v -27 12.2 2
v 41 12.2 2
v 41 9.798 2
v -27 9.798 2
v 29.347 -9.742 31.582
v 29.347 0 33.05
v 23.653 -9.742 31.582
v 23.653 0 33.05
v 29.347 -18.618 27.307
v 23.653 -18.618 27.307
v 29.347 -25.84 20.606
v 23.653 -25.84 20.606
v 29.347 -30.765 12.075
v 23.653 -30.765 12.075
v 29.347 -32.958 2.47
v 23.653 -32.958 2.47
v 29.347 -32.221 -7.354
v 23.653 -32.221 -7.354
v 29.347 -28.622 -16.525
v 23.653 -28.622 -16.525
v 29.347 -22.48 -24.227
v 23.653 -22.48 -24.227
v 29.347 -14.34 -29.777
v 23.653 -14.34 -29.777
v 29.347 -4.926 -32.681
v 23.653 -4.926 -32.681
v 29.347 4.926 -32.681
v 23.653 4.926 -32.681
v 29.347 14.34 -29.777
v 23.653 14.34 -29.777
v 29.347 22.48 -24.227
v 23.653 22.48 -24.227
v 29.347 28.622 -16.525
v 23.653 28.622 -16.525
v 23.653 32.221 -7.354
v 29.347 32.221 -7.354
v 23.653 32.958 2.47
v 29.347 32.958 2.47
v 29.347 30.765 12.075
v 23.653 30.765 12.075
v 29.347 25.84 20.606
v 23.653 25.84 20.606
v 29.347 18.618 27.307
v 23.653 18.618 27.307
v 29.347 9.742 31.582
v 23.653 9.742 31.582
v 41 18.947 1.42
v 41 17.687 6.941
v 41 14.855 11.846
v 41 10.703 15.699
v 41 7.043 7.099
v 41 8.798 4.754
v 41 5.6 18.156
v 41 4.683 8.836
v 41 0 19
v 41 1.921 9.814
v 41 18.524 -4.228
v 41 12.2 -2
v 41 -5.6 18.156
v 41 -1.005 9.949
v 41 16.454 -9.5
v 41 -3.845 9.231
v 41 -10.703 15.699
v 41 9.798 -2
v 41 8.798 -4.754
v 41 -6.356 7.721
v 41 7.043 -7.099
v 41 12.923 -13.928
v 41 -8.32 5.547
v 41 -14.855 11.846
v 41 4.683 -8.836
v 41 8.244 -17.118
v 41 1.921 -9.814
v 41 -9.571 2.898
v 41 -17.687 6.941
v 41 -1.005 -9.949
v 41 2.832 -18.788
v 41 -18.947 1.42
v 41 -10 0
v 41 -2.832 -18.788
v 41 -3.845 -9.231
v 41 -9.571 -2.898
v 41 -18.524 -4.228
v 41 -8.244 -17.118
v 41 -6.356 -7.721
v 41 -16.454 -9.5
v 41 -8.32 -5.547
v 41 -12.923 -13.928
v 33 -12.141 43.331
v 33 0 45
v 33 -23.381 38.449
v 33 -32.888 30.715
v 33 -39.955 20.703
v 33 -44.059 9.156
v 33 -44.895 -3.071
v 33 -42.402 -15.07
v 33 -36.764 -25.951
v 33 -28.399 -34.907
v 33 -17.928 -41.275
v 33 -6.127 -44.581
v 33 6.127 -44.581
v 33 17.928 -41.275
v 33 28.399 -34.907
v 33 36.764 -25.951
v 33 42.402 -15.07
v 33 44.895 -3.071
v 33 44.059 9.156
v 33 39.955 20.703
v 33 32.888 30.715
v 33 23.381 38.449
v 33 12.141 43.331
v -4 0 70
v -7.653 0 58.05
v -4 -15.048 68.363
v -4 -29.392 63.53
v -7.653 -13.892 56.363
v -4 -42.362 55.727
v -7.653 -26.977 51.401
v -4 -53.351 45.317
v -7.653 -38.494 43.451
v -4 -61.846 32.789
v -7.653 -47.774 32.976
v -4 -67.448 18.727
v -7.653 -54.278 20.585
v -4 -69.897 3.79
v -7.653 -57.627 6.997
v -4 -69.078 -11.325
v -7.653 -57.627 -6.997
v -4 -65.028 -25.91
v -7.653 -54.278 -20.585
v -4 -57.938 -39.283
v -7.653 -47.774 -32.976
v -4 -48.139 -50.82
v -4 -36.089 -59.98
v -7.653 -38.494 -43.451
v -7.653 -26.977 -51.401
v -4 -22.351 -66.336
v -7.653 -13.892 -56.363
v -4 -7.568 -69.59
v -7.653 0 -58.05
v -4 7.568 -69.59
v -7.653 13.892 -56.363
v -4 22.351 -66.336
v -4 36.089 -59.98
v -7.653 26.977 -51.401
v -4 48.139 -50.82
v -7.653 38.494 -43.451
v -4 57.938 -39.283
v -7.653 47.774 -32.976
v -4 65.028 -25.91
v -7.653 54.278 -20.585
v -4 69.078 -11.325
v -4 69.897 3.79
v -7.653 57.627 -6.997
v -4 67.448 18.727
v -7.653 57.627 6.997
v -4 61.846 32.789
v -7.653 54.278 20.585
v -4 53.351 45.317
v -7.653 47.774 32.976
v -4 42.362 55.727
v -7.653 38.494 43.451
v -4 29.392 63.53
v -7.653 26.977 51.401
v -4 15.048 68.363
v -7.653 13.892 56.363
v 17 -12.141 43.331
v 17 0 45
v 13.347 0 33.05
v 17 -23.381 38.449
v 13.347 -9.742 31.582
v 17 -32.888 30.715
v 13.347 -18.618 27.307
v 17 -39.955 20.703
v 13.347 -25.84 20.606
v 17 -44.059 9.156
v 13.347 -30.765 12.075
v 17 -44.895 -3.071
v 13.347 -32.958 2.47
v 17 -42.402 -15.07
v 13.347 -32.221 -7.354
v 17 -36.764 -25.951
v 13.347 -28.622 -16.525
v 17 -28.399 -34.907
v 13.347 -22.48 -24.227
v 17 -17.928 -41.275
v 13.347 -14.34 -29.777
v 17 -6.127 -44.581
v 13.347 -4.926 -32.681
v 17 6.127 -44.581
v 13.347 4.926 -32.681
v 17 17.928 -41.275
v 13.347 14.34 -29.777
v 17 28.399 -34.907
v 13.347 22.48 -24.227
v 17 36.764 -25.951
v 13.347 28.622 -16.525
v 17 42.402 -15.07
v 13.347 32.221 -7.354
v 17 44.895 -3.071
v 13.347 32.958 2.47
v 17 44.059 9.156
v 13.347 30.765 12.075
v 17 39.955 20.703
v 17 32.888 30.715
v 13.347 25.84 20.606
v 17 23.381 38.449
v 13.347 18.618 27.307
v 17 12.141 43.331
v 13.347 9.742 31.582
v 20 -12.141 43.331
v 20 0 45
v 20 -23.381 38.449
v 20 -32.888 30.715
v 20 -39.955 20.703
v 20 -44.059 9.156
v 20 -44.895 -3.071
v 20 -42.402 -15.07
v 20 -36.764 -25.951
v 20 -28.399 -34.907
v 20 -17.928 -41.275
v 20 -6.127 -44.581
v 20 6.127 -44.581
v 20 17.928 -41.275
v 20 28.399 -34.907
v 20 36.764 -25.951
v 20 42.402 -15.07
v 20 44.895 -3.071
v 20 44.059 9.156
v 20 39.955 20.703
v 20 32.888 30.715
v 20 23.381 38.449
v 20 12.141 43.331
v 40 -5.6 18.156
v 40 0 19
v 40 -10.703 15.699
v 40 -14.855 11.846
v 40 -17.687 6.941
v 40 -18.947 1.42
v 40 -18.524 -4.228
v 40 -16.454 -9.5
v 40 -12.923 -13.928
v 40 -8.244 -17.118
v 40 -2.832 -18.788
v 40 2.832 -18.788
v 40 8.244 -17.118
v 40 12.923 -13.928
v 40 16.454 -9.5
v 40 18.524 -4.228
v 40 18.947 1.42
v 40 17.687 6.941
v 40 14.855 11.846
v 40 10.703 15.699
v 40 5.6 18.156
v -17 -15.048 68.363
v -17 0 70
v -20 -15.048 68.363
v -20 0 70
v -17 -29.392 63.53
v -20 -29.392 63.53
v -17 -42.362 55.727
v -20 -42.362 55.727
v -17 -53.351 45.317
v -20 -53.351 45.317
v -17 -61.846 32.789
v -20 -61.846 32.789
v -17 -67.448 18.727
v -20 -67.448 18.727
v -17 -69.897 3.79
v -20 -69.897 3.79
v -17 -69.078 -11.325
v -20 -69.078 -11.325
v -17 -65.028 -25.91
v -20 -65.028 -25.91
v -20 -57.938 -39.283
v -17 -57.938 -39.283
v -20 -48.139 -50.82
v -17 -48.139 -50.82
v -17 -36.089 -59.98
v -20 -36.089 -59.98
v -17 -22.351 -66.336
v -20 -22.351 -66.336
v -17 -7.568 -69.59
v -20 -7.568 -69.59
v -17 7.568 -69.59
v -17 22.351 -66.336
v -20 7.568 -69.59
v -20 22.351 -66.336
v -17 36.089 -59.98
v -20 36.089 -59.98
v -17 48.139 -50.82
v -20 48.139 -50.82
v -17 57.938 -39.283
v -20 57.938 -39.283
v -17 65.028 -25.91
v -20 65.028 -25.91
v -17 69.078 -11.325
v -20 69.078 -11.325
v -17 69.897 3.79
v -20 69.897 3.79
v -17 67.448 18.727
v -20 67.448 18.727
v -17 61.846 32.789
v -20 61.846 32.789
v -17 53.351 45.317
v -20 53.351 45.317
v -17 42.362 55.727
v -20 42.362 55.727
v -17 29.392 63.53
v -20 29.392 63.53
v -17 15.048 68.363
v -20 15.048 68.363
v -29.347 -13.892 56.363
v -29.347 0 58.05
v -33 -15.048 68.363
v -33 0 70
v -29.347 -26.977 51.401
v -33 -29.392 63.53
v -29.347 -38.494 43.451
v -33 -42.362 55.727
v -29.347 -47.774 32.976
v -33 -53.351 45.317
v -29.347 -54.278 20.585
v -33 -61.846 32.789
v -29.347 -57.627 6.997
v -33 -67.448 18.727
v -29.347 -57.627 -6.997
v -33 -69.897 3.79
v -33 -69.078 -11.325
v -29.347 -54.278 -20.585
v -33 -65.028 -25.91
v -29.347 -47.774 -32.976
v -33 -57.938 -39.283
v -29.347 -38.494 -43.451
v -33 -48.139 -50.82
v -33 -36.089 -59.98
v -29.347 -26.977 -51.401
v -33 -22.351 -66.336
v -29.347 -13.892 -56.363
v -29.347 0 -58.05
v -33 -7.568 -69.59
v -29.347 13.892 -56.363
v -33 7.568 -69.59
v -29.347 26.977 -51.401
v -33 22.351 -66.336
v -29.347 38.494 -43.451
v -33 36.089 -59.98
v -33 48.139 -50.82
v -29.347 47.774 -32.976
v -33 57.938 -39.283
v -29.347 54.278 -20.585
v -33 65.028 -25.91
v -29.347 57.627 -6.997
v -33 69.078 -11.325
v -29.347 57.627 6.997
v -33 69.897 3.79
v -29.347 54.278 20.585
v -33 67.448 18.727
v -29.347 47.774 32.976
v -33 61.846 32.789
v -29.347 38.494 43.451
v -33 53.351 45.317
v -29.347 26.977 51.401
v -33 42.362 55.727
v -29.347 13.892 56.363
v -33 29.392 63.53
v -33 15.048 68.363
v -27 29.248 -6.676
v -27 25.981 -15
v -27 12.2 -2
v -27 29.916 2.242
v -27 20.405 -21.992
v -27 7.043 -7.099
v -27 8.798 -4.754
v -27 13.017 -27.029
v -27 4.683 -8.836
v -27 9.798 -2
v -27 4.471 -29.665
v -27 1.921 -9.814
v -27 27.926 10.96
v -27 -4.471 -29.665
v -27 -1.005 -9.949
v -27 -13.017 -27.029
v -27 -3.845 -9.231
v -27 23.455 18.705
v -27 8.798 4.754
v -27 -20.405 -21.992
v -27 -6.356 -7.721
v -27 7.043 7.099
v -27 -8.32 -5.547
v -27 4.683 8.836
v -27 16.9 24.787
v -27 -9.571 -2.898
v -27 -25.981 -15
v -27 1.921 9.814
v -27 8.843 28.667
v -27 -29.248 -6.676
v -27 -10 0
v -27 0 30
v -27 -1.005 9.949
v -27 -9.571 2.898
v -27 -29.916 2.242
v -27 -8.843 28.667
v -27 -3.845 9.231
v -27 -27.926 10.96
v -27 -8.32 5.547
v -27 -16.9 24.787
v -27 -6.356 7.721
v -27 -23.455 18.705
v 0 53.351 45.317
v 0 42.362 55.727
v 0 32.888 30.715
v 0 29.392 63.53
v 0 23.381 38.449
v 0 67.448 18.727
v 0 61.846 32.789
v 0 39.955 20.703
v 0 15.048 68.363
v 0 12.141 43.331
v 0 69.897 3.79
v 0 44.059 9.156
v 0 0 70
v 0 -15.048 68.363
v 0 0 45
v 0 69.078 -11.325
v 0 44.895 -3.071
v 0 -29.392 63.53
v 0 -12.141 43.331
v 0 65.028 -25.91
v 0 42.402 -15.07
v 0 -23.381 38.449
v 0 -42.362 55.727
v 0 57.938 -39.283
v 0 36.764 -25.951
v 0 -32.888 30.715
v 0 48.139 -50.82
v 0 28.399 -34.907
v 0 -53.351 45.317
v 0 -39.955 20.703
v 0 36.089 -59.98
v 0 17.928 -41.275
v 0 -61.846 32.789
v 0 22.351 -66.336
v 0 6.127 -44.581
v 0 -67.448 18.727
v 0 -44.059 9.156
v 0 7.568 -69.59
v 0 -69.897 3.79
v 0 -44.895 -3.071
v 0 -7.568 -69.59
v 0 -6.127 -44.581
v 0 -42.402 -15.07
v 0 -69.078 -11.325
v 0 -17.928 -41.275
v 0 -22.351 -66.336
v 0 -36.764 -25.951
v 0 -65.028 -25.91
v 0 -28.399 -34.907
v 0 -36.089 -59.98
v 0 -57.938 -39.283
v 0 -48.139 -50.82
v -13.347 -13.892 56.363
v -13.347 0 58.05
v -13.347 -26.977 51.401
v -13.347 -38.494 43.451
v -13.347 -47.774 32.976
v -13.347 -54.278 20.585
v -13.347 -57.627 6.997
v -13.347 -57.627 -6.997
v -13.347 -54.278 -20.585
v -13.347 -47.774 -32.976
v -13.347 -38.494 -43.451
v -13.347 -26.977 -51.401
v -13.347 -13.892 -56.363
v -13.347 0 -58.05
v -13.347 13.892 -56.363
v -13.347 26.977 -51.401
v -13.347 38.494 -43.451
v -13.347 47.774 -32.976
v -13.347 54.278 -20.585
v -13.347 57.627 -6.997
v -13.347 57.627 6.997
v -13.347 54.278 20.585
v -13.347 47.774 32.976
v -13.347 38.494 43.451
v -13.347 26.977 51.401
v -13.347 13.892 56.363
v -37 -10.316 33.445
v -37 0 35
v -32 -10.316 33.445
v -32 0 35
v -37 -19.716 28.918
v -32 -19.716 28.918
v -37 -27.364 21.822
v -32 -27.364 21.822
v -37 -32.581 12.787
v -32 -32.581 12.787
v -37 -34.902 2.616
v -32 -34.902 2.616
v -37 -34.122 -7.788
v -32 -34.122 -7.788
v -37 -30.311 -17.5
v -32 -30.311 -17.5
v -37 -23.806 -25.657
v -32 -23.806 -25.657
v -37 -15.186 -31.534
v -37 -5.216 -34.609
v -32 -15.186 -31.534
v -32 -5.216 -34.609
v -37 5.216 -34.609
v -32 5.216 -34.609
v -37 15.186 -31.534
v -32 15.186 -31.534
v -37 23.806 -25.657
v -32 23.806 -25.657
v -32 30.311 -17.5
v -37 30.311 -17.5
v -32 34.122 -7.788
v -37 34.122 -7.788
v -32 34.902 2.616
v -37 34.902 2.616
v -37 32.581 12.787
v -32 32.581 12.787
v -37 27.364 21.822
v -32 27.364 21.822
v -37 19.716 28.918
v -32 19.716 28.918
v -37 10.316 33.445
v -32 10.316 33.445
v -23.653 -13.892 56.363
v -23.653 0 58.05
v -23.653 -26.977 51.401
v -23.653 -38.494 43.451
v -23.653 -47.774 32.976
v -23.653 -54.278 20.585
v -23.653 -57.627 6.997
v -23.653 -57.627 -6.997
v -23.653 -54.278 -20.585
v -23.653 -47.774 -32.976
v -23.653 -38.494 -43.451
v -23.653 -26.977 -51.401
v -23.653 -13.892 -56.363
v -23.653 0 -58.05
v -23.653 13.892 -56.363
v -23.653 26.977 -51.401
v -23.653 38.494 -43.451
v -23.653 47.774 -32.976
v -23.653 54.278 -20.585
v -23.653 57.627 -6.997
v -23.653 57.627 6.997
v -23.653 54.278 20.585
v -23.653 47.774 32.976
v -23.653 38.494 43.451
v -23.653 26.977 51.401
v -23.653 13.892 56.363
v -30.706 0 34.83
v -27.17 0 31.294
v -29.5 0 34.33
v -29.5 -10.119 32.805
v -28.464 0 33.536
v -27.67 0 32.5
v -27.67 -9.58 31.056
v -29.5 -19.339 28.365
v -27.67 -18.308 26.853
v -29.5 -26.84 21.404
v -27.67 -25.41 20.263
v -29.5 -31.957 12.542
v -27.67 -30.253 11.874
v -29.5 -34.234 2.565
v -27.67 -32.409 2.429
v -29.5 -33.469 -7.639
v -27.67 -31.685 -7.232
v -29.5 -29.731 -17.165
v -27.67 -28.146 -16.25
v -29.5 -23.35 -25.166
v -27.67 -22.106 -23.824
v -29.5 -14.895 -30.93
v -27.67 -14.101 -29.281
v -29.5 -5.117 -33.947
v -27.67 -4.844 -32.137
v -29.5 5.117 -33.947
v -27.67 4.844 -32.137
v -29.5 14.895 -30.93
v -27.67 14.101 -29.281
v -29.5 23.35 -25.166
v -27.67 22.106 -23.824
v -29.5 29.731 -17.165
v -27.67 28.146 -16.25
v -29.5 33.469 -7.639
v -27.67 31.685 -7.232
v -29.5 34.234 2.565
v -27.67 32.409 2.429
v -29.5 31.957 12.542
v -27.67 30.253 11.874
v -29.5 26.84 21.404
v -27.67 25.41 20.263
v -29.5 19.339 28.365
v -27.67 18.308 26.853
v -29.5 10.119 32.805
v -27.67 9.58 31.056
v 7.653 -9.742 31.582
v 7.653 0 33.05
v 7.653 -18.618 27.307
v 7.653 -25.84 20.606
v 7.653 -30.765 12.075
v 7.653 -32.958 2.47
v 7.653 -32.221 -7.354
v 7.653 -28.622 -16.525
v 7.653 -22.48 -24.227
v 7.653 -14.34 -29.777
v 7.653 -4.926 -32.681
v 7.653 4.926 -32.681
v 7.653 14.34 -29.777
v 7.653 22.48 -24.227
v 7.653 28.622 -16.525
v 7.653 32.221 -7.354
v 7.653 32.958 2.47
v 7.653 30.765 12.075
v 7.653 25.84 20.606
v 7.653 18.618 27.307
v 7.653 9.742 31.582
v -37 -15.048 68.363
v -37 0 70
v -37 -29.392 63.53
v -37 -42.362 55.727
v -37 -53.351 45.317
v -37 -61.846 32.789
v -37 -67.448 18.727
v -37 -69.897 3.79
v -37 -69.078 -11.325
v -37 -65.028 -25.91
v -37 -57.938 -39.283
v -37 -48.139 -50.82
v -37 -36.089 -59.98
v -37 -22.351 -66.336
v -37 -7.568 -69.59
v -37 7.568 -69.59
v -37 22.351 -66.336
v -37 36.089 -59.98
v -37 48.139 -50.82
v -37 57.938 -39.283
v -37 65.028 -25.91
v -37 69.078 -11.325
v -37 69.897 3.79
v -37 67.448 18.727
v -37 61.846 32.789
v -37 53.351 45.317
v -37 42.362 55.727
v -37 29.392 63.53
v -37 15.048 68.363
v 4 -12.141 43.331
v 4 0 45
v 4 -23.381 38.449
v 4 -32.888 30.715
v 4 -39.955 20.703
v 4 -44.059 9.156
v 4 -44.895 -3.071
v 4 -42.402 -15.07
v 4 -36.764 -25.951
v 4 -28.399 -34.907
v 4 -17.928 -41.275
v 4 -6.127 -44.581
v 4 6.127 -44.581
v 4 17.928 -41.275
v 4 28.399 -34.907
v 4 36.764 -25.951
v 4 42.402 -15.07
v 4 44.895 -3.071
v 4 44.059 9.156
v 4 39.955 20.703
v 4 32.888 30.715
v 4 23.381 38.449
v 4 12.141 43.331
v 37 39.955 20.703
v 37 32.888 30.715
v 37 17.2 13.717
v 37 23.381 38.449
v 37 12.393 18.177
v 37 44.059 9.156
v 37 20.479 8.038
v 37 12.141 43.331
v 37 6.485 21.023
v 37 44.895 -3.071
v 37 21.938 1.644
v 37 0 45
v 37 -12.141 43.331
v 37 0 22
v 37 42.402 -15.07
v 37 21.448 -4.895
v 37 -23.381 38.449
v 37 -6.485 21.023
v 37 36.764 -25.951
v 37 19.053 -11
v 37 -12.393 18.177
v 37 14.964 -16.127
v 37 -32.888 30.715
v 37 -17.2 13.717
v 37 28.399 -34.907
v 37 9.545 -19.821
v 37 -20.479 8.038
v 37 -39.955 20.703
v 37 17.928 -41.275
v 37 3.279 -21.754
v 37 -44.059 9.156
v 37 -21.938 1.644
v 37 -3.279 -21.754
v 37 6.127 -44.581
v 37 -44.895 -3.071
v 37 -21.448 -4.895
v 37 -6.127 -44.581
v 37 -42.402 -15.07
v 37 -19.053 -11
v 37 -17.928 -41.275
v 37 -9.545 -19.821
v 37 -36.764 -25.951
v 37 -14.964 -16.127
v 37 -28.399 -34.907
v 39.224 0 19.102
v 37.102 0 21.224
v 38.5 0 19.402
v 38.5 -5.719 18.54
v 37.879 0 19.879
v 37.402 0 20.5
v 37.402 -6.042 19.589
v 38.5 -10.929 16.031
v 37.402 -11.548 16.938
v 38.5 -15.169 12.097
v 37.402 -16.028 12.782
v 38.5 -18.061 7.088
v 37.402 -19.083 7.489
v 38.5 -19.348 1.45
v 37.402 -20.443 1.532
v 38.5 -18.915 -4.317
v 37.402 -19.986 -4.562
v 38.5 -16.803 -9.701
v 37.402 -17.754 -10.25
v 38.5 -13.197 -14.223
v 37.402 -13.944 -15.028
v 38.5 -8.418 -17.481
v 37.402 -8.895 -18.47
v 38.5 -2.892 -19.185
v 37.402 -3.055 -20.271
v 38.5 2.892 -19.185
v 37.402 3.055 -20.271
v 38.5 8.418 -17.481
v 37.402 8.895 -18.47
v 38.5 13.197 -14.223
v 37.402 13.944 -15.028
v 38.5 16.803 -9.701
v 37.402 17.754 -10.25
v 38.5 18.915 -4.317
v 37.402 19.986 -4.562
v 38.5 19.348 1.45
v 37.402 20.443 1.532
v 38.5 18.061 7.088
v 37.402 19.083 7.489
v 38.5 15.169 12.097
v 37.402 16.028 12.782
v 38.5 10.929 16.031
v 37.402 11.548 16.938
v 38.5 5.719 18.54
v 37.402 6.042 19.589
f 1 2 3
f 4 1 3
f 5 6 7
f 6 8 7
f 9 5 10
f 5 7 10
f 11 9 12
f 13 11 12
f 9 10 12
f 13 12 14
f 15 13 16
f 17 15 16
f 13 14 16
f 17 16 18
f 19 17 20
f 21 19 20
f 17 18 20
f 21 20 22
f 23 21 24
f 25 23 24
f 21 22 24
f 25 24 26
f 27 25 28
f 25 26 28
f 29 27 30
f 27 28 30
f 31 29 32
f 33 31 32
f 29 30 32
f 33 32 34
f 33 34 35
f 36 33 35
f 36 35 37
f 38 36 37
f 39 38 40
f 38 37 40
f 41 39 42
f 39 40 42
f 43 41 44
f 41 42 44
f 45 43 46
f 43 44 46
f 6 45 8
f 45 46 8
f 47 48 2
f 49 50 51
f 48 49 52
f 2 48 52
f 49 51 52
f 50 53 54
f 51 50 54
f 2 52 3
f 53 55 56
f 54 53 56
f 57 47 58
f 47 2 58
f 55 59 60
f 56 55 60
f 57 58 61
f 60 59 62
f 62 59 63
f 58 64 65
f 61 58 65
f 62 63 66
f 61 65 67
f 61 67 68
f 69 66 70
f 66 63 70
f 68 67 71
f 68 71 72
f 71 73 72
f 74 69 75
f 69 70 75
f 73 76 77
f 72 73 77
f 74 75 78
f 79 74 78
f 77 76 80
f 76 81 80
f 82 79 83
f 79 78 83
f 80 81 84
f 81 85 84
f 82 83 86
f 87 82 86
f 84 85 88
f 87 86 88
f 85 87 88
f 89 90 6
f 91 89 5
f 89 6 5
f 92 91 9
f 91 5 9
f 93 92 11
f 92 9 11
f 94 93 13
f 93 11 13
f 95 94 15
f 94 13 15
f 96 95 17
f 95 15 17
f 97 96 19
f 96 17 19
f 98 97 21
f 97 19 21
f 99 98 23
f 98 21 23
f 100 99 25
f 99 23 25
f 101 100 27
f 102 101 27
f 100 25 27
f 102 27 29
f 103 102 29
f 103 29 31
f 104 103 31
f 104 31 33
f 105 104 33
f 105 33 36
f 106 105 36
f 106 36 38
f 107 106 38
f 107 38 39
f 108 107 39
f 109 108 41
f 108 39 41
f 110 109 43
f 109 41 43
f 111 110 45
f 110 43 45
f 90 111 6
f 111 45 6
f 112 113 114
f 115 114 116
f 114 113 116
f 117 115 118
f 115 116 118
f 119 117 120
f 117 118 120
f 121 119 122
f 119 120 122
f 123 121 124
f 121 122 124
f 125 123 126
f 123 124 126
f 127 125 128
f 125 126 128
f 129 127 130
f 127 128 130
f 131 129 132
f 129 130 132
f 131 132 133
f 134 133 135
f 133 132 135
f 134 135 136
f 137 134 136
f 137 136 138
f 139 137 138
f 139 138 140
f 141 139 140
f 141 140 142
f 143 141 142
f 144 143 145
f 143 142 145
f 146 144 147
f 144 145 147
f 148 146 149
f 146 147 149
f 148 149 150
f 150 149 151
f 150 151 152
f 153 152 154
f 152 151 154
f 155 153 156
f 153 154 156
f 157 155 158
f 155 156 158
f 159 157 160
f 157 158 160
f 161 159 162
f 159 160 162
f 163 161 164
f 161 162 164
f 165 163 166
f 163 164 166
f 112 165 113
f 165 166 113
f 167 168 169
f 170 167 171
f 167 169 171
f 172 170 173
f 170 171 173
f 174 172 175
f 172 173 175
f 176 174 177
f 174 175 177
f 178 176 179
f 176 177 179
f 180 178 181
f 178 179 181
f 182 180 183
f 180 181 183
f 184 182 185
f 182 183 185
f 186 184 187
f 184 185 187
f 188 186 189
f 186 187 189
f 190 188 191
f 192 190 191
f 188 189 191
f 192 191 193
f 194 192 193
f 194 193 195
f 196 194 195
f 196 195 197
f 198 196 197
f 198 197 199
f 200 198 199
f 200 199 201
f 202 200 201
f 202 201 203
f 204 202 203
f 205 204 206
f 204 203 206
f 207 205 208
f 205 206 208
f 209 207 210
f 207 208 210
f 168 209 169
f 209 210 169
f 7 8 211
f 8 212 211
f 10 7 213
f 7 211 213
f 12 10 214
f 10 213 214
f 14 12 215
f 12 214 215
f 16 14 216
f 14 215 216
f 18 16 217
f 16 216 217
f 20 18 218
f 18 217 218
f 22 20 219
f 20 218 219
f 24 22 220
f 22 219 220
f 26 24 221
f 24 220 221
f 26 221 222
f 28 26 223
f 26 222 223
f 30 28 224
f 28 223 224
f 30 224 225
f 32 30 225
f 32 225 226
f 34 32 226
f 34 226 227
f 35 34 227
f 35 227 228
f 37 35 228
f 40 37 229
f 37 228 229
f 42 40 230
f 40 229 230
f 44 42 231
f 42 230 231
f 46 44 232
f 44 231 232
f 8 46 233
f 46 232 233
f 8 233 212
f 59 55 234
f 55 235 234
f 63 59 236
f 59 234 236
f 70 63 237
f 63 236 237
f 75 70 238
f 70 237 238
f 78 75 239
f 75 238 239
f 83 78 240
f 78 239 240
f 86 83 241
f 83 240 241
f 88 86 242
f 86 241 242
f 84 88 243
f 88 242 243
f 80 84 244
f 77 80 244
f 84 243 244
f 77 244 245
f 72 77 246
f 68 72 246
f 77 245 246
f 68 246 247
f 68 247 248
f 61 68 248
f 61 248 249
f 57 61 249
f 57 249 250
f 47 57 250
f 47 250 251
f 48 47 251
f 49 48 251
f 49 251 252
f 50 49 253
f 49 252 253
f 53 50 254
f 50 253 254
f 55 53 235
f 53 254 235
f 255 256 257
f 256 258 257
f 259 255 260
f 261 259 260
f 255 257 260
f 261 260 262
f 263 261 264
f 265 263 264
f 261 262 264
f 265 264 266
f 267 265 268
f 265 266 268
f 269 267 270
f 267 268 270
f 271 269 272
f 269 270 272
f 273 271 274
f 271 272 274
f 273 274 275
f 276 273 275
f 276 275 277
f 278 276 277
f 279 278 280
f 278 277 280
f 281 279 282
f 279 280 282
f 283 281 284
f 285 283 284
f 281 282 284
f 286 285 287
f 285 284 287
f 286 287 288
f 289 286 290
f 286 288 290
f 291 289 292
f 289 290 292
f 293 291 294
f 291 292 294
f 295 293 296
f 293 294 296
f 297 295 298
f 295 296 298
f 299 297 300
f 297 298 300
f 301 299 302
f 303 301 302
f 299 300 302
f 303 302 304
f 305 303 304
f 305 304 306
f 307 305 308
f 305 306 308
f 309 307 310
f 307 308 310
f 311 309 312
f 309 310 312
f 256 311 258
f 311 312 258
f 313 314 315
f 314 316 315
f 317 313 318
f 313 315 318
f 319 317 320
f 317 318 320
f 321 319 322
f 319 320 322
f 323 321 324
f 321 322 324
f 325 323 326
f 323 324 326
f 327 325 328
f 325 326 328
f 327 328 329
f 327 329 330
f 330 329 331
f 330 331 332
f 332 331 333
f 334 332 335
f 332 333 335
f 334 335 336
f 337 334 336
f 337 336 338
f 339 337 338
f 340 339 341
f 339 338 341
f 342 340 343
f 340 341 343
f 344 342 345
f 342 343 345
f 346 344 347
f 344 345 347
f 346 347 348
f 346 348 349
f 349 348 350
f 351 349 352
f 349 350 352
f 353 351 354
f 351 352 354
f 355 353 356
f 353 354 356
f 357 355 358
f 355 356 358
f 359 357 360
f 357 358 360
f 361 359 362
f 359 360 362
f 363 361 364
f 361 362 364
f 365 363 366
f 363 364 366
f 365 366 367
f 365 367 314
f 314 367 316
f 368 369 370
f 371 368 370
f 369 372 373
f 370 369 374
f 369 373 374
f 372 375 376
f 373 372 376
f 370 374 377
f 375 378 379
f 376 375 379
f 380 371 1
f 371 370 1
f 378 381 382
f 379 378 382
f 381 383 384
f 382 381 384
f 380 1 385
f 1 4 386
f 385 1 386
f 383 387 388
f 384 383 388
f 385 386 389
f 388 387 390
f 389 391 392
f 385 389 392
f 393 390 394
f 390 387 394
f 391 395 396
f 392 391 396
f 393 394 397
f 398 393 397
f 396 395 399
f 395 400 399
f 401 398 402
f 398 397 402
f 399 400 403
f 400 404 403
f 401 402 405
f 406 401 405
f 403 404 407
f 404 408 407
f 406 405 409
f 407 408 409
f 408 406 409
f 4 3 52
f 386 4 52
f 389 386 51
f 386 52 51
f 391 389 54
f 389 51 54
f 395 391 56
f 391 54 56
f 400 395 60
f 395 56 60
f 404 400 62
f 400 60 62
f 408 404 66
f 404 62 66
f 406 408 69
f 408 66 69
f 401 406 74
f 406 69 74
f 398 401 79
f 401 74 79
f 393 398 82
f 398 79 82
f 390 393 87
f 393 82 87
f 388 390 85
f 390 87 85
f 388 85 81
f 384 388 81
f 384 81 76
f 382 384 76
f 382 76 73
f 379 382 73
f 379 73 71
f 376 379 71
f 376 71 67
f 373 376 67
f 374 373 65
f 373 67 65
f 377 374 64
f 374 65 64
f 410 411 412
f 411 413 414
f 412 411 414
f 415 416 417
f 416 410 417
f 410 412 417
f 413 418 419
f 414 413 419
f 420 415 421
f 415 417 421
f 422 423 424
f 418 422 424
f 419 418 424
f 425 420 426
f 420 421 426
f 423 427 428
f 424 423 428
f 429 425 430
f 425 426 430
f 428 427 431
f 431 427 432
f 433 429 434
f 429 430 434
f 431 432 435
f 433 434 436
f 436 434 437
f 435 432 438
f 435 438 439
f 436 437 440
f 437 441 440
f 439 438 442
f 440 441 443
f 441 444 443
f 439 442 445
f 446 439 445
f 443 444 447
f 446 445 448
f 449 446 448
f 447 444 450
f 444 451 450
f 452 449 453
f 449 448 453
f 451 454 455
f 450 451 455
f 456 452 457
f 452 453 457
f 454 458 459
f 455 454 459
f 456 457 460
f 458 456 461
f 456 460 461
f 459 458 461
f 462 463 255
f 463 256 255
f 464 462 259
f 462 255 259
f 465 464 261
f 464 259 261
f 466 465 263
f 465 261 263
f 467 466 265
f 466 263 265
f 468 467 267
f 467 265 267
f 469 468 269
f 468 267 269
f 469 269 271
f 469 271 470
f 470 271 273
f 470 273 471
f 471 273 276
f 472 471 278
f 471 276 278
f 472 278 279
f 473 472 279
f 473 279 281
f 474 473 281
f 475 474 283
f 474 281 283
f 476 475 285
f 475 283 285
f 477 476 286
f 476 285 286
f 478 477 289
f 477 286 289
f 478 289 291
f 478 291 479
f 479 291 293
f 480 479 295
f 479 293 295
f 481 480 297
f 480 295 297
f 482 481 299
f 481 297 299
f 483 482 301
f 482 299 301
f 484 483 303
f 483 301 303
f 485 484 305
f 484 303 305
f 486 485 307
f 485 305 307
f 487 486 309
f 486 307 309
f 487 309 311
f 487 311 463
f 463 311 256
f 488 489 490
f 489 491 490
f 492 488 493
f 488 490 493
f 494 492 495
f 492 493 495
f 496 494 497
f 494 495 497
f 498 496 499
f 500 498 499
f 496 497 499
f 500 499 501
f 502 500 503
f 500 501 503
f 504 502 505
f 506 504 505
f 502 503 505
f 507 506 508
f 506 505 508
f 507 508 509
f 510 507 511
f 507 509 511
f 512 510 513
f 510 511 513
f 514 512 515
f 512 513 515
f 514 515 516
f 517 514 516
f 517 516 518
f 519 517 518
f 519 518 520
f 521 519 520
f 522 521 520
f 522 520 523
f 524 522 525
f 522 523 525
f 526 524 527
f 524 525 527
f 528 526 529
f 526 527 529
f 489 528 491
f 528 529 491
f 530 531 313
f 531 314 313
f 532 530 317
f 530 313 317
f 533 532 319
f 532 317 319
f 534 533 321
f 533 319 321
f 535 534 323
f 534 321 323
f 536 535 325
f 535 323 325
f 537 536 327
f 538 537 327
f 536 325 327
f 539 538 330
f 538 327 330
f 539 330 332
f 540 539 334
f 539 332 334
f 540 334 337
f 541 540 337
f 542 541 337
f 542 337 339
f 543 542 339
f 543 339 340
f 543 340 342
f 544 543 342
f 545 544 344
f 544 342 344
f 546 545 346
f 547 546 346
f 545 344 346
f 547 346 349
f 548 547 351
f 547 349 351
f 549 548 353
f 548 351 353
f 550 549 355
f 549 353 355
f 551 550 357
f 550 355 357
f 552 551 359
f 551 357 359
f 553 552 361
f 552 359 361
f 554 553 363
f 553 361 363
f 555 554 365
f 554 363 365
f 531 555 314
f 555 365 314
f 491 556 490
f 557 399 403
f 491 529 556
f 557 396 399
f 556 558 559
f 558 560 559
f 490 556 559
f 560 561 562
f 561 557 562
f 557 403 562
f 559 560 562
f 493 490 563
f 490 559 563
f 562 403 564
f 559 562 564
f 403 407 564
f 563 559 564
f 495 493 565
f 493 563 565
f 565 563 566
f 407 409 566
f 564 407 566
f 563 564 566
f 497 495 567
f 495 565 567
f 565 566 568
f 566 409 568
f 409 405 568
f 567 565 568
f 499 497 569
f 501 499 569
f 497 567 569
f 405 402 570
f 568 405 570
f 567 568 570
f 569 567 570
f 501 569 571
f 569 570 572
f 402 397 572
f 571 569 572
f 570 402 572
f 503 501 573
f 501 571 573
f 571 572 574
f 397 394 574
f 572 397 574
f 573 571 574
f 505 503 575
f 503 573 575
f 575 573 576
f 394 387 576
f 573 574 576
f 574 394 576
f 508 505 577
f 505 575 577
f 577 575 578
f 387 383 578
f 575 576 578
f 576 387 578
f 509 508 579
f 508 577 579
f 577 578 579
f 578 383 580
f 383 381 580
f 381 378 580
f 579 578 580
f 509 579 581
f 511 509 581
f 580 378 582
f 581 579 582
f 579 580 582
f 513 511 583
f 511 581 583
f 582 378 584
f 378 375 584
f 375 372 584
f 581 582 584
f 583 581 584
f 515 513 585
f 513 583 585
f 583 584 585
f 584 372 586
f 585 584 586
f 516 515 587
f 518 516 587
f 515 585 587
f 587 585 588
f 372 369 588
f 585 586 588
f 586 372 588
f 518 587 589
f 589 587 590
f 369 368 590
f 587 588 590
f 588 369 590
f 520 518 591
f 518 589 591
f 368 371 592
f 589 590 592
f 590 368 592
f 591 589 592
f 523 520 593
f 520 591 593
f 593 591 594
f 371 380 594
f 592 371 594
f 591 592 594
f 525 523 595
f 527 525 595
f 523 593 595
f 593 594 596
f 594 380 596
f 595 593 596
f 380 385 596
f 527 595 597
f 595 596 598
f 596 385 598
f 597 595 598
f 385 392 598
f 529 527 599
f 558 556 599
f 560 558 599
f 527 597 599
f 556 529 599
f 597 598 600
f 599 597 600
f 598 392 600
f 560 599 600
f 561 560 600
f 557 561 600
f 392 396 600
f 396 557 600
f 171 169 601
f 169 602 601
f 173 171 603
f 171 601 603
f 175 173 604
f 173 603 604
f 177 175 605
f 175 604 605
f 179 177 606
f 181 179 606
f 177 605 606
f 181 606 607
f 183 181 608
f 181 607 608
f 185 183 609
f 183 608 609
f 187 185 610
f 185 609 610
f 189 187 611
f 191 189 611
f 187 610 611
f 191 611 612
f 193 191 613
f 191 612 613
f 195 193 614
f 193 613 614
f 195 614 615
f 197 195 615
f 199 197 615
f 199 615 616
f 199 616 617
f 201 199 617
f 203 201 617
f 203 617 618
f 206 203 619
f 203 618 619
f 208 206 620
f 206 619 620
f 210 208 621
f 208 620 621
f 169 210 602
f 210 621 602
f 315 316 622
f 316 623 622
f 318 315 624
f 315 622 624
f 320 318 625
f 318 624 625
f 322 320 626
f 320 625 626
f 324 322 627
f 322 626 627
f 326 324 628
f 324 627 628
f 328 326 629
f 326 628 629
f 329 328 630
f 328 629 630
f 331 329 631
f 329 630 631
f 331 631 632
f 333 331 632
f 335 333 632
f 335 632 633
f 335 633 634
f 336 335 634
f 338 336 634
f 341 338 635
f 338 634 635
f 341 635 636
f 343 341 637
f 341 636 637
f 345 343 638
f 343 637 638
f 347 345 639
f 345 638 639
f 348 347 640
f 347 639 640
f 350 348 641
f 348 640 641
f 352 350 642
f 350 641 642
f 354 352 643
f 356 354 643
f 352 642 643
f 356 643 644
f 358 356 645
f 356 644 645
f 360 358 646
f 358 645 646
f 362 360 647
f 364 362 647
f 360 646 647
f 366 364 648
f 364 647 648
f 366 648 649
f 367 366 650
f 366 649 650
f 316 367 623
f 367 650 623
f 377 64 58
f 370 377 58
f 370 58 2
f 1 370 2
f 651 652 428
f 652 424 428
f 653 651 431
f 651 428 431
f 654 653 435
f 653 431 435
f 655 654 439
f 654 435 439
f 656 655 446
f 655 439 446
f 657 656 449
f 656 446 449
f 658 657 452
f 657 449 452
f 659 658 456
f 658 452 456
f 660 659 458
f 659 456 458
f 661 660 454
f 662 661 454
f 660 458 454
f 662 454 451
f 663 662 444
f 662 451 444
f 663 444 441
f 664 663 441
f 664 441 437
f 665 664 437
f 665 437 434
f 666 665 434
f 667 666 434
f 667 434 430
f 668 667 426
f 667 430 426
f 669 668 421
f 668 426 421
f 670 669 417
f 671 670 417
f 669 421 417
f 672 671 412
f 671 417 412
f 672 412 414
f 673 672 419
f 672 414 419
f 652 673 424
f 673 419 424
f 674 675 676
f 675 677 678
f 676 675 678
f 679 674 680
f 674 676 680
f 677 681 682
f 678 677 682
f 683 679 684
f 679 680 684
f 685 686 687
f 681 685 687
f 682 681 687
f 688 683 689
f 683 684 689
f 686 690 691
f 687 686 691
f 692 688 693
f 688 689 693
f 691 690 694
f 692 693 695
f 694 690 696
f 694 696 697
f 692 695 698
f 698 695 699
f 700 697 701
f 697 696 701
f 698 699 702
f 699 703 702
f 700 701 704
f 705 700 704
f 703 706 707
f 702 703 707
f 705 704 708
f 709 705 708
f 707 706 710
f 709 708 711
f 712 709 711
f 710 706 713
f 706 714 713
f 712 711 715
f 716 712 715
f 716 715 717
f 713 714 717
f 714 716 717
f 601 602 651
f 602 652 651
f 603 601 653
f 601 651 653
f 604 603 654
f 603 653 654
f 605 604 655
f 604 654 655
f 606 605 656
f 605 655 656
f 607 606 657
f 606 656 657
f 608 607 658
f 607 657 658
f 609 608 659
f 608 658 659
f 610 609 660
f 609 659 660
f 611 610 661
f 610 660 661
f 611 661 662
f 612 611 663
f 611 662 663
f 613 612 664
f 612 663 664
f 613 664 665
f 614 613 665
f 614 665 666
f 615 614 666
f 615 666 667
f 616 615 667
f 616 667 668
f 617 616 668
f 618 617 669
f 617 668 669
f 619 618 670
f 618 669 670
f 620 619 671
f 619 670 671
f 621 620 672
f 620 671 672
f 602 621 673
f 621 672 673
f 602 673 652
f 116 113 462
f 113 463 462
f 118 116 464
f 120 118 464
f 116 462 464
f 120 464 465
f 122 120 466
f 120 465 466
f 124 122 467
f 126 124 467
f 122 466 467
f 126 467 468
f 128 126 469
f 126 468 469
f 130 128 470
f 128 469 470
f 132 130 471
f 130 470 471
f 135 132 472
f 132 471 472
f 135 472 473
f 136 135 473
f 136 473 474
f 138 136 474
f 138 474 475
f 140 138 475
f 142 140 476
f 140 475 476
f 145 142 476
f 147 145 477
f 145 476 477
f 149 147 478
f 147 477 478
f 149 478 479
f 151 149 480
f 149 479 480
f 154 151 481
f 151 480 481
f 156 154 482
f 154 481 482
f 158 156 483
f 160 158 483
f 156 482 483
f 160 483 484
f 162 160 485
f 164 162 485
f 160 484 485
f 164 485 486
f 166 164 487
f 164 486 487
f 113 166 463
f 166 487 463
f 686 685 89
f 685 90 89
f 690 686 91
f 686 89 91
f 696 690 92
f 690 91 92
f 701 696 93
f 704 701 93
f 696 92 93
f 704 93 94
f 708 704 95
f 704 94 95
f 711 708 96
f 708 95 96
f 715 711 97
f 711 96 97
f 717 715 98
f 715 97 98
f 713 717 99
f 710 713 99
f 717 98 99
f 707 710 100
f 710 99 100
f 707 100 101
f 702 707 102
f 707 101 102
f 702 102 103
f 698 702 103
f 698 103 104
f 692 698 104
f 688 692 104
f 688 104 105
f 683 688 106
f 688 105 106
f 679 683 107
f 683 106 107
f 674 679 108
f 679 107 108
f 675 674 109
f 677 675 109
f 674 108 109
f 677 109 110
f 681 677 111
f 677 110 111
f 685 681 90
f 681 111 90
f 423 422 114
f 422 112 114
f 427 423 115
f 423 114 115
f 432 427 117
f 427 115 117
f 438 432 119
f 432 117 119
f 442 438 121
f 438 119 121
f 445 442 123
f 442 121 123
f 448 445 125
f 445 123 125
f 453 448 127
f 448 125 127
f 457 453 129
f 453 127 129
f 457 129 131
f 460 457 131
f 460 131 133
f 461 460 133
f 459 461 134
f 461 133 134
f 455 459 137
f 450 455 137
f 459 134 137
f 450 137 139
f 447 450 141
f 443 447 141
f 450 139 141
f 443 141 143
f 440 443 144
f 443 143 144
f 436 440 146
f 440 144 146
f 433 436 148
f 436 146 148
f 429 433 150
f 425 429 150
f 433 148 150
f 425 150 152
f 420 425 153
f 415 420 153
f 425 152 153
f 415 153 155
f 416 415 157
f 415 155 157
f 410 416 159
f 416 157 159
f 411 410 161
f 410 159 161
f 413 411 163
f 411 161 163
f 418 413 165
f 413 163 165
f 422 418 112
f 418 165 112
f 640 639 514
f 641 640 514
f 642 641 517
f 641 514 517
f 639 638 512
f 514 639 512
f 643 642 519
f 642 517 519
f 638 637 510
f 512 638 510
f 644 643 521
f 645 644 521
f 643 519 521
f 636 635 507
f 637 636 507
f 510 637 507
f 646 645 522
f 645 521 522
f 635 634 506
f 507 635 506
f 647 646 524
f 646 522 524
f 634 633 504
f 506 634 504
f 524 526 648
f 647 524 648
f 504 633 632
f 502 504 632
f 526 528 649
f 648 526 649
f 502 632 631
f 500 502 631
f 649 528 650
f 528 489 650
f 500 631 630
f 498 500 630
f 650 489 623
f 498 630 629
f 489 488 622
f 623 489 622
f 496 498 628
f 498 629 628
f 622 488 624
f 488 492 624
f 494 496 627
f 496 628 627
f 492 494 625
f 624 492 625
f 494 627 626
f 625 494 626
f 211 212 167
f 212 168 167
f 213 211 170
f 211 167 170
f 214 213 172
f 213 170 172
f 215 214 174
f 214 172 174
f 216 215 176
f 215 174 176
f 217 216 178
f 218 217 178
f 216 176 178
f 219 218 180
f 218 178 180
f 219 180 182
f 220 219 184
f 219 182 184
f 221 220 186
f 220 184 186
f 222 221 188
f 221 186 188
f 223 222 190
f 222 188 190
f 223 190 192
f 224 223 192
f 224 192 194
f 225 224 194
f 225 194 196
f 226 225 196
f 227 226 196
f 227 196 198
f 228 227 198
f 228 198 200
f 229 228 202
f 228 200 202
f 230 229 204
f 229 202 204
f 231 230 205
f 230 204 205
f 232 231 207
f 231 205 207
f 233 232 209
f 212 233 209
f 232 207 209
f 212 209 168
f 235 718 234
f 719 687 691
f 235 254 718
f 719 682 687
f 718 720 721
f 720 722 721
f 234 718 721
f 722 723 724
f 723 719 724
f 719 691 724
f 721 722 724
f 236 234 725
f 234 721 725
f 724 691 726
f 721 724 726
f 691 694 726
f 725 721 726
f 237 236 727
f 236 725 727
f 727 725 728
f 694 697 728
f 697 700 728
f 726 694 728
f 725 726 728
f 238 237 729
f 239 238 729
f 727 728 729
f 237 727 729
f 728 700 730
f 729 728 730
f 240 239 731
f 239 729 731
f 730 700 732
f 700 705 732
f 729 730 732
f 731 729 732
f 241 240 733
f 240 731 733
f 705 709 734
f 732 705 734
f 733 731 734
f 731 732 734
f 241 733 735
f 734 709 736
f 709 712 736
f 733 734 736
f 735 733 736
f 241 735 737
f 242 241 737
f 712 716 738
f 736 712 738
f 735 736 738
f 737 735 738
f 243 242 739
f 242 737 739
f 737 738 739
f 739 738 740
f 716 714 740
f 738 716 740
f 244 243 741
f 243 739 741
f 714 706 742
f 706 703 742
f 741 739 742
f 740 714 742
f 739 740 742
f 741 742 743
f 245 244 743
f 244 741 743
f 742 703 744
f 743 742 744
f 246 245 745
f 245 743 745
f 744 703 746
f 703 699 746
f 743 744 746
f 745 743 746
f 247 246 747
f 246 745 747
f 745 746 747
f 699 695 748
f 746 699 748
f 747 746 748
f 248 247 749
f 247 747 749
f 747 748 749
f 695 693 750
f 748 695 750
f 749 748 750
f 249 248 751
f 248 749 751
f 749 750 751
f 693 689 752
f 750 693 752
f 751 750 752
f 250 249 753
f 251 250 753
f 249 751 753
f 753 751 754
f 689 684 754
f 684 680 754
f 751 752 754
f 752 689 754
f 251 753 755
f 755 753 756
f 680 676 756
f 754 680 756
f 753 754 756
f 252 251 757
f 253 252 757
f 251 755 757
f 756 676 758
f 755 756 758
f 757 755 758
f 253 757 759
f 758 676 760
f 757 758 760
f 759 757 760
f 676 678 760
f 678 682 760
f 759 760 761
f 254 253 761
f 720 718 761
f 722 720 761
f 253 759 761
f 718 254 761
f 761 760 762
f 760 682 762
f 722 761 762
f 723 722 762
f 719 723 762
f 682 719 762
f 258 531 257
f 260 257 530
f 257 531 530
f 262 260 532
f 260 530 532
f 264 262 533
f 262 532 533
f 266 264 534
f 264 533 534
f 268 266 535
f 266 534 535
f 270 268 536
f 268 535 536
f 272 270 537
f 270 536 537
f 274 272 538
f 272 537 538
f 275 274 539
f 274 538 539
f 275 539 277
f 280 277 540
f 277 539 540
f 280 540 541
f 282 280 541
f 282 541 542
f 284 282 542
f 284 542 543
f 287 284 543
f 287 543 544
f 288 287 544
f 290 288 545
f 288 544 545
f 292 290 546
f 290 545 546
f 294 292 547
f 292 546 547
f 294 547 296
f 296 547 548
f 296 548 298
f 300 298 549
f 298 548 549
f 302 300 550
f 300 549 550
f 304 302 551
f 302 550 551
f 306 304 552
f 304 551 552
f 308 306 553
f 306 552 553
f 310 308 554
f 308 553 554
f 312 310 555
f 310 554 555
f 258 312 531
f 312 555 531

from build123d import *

# Parameters (mm, degrees)
F3_DEPTH = 78.001


with BuildPart() as f1:
    # F0 (on Front) → F1 (revolve)
    with BuildSketch(Plane.XZ):
        with BuildLine():
            Line((-27, 10), (41, 10))
            Line((41, 10), (41, 19))
            Line((41, 19), (40, 19))
            ThreePointArc((40, 19), (37.8786796564, 19.8786796564), (37, 22))
            Line((37, 22), (37, 45))
            Line((37, 45), (33, 45))
            Line((33, 45), (29.3465183566, 33.05))
            Line((29.3465183566, 33.05), (23.6534816434, 33.05))
            Line((23.6534816434, 33.05), (20, 45))
            Line((20, 45), (17, 45))
            Line((17, 45), (13.3465183566, 33.05))
            Line((13.3465183566, 33.05), (7.6534816434, 33.05))
            Line((7.6534816434, 33.05), (4, 45))
            Line((4, 45), (0, 45))
            Line((0, 45), (0, 70))
            Line((0, 70), (-4, 70))
            Line((-4, 70), (-7.6534816434, 58.05))
            Line((-7.6534816434, 58.05), (-13.3465183566, 58.05))
            Line((-13.3465183566, 58.05), (-17, 70))
            Line((-17, 70), (-20, 70))
            Line((-20, 70), (-23.6534816434, 58.05))
            Line((-23.6534816434, 58.05), (-29.3465183566, 58.05))
            Line((-29.3465183566, 58.05), (-33, 70))
            Line((-33, 70), (-37, 70))
            Line((-37, 70), (-37, 35))
            Line((-37, 35), (-32, 35))
            ThreePointArc((-32, 35), (-28.4644660941, 33.5355339059), (-27, 30))
            Line((-27, 30), (-27, 10))
        make_face()
    revolve(axis=Axis((1.6295525322, 0, 0), (1, 0, 0)))

    # F2 (on face) → F3 (cut, through all)
    with BuildSketch(Plane.YZ.offset(41)):
        with BuildLine():
            ThreePointArc((9.7979589711, 2), (-10, 0), (9.7979589711, -2))
            ThreePointArc((9.7979589711, -2), (9.9493615301, -1.0050896201), (10, 0))
            ThreePointArc((10, 0), (9.9493615301, 1.0050896201), (9.7979589711, 2))
        make_face()
        with BuildLine():
            ThreePointArc((10, 0), (9.9493615301, -1.0050896201), (9.7979589711, -2))
            Line((9.7979589711, -2), (12.2, -2))
            Line((12.2, -2), (12.2, 2))
            Line((12.2, 2), (9.7979589711, 2))
            ThreePointArc((9.7979589711, 2), (9.9493615301, 1.0050896201), (10, 0))
        make_face()
    extrude(amount=-F3_DEPTH, mode=Mode.SUBTRACT)


solid = f1.part
